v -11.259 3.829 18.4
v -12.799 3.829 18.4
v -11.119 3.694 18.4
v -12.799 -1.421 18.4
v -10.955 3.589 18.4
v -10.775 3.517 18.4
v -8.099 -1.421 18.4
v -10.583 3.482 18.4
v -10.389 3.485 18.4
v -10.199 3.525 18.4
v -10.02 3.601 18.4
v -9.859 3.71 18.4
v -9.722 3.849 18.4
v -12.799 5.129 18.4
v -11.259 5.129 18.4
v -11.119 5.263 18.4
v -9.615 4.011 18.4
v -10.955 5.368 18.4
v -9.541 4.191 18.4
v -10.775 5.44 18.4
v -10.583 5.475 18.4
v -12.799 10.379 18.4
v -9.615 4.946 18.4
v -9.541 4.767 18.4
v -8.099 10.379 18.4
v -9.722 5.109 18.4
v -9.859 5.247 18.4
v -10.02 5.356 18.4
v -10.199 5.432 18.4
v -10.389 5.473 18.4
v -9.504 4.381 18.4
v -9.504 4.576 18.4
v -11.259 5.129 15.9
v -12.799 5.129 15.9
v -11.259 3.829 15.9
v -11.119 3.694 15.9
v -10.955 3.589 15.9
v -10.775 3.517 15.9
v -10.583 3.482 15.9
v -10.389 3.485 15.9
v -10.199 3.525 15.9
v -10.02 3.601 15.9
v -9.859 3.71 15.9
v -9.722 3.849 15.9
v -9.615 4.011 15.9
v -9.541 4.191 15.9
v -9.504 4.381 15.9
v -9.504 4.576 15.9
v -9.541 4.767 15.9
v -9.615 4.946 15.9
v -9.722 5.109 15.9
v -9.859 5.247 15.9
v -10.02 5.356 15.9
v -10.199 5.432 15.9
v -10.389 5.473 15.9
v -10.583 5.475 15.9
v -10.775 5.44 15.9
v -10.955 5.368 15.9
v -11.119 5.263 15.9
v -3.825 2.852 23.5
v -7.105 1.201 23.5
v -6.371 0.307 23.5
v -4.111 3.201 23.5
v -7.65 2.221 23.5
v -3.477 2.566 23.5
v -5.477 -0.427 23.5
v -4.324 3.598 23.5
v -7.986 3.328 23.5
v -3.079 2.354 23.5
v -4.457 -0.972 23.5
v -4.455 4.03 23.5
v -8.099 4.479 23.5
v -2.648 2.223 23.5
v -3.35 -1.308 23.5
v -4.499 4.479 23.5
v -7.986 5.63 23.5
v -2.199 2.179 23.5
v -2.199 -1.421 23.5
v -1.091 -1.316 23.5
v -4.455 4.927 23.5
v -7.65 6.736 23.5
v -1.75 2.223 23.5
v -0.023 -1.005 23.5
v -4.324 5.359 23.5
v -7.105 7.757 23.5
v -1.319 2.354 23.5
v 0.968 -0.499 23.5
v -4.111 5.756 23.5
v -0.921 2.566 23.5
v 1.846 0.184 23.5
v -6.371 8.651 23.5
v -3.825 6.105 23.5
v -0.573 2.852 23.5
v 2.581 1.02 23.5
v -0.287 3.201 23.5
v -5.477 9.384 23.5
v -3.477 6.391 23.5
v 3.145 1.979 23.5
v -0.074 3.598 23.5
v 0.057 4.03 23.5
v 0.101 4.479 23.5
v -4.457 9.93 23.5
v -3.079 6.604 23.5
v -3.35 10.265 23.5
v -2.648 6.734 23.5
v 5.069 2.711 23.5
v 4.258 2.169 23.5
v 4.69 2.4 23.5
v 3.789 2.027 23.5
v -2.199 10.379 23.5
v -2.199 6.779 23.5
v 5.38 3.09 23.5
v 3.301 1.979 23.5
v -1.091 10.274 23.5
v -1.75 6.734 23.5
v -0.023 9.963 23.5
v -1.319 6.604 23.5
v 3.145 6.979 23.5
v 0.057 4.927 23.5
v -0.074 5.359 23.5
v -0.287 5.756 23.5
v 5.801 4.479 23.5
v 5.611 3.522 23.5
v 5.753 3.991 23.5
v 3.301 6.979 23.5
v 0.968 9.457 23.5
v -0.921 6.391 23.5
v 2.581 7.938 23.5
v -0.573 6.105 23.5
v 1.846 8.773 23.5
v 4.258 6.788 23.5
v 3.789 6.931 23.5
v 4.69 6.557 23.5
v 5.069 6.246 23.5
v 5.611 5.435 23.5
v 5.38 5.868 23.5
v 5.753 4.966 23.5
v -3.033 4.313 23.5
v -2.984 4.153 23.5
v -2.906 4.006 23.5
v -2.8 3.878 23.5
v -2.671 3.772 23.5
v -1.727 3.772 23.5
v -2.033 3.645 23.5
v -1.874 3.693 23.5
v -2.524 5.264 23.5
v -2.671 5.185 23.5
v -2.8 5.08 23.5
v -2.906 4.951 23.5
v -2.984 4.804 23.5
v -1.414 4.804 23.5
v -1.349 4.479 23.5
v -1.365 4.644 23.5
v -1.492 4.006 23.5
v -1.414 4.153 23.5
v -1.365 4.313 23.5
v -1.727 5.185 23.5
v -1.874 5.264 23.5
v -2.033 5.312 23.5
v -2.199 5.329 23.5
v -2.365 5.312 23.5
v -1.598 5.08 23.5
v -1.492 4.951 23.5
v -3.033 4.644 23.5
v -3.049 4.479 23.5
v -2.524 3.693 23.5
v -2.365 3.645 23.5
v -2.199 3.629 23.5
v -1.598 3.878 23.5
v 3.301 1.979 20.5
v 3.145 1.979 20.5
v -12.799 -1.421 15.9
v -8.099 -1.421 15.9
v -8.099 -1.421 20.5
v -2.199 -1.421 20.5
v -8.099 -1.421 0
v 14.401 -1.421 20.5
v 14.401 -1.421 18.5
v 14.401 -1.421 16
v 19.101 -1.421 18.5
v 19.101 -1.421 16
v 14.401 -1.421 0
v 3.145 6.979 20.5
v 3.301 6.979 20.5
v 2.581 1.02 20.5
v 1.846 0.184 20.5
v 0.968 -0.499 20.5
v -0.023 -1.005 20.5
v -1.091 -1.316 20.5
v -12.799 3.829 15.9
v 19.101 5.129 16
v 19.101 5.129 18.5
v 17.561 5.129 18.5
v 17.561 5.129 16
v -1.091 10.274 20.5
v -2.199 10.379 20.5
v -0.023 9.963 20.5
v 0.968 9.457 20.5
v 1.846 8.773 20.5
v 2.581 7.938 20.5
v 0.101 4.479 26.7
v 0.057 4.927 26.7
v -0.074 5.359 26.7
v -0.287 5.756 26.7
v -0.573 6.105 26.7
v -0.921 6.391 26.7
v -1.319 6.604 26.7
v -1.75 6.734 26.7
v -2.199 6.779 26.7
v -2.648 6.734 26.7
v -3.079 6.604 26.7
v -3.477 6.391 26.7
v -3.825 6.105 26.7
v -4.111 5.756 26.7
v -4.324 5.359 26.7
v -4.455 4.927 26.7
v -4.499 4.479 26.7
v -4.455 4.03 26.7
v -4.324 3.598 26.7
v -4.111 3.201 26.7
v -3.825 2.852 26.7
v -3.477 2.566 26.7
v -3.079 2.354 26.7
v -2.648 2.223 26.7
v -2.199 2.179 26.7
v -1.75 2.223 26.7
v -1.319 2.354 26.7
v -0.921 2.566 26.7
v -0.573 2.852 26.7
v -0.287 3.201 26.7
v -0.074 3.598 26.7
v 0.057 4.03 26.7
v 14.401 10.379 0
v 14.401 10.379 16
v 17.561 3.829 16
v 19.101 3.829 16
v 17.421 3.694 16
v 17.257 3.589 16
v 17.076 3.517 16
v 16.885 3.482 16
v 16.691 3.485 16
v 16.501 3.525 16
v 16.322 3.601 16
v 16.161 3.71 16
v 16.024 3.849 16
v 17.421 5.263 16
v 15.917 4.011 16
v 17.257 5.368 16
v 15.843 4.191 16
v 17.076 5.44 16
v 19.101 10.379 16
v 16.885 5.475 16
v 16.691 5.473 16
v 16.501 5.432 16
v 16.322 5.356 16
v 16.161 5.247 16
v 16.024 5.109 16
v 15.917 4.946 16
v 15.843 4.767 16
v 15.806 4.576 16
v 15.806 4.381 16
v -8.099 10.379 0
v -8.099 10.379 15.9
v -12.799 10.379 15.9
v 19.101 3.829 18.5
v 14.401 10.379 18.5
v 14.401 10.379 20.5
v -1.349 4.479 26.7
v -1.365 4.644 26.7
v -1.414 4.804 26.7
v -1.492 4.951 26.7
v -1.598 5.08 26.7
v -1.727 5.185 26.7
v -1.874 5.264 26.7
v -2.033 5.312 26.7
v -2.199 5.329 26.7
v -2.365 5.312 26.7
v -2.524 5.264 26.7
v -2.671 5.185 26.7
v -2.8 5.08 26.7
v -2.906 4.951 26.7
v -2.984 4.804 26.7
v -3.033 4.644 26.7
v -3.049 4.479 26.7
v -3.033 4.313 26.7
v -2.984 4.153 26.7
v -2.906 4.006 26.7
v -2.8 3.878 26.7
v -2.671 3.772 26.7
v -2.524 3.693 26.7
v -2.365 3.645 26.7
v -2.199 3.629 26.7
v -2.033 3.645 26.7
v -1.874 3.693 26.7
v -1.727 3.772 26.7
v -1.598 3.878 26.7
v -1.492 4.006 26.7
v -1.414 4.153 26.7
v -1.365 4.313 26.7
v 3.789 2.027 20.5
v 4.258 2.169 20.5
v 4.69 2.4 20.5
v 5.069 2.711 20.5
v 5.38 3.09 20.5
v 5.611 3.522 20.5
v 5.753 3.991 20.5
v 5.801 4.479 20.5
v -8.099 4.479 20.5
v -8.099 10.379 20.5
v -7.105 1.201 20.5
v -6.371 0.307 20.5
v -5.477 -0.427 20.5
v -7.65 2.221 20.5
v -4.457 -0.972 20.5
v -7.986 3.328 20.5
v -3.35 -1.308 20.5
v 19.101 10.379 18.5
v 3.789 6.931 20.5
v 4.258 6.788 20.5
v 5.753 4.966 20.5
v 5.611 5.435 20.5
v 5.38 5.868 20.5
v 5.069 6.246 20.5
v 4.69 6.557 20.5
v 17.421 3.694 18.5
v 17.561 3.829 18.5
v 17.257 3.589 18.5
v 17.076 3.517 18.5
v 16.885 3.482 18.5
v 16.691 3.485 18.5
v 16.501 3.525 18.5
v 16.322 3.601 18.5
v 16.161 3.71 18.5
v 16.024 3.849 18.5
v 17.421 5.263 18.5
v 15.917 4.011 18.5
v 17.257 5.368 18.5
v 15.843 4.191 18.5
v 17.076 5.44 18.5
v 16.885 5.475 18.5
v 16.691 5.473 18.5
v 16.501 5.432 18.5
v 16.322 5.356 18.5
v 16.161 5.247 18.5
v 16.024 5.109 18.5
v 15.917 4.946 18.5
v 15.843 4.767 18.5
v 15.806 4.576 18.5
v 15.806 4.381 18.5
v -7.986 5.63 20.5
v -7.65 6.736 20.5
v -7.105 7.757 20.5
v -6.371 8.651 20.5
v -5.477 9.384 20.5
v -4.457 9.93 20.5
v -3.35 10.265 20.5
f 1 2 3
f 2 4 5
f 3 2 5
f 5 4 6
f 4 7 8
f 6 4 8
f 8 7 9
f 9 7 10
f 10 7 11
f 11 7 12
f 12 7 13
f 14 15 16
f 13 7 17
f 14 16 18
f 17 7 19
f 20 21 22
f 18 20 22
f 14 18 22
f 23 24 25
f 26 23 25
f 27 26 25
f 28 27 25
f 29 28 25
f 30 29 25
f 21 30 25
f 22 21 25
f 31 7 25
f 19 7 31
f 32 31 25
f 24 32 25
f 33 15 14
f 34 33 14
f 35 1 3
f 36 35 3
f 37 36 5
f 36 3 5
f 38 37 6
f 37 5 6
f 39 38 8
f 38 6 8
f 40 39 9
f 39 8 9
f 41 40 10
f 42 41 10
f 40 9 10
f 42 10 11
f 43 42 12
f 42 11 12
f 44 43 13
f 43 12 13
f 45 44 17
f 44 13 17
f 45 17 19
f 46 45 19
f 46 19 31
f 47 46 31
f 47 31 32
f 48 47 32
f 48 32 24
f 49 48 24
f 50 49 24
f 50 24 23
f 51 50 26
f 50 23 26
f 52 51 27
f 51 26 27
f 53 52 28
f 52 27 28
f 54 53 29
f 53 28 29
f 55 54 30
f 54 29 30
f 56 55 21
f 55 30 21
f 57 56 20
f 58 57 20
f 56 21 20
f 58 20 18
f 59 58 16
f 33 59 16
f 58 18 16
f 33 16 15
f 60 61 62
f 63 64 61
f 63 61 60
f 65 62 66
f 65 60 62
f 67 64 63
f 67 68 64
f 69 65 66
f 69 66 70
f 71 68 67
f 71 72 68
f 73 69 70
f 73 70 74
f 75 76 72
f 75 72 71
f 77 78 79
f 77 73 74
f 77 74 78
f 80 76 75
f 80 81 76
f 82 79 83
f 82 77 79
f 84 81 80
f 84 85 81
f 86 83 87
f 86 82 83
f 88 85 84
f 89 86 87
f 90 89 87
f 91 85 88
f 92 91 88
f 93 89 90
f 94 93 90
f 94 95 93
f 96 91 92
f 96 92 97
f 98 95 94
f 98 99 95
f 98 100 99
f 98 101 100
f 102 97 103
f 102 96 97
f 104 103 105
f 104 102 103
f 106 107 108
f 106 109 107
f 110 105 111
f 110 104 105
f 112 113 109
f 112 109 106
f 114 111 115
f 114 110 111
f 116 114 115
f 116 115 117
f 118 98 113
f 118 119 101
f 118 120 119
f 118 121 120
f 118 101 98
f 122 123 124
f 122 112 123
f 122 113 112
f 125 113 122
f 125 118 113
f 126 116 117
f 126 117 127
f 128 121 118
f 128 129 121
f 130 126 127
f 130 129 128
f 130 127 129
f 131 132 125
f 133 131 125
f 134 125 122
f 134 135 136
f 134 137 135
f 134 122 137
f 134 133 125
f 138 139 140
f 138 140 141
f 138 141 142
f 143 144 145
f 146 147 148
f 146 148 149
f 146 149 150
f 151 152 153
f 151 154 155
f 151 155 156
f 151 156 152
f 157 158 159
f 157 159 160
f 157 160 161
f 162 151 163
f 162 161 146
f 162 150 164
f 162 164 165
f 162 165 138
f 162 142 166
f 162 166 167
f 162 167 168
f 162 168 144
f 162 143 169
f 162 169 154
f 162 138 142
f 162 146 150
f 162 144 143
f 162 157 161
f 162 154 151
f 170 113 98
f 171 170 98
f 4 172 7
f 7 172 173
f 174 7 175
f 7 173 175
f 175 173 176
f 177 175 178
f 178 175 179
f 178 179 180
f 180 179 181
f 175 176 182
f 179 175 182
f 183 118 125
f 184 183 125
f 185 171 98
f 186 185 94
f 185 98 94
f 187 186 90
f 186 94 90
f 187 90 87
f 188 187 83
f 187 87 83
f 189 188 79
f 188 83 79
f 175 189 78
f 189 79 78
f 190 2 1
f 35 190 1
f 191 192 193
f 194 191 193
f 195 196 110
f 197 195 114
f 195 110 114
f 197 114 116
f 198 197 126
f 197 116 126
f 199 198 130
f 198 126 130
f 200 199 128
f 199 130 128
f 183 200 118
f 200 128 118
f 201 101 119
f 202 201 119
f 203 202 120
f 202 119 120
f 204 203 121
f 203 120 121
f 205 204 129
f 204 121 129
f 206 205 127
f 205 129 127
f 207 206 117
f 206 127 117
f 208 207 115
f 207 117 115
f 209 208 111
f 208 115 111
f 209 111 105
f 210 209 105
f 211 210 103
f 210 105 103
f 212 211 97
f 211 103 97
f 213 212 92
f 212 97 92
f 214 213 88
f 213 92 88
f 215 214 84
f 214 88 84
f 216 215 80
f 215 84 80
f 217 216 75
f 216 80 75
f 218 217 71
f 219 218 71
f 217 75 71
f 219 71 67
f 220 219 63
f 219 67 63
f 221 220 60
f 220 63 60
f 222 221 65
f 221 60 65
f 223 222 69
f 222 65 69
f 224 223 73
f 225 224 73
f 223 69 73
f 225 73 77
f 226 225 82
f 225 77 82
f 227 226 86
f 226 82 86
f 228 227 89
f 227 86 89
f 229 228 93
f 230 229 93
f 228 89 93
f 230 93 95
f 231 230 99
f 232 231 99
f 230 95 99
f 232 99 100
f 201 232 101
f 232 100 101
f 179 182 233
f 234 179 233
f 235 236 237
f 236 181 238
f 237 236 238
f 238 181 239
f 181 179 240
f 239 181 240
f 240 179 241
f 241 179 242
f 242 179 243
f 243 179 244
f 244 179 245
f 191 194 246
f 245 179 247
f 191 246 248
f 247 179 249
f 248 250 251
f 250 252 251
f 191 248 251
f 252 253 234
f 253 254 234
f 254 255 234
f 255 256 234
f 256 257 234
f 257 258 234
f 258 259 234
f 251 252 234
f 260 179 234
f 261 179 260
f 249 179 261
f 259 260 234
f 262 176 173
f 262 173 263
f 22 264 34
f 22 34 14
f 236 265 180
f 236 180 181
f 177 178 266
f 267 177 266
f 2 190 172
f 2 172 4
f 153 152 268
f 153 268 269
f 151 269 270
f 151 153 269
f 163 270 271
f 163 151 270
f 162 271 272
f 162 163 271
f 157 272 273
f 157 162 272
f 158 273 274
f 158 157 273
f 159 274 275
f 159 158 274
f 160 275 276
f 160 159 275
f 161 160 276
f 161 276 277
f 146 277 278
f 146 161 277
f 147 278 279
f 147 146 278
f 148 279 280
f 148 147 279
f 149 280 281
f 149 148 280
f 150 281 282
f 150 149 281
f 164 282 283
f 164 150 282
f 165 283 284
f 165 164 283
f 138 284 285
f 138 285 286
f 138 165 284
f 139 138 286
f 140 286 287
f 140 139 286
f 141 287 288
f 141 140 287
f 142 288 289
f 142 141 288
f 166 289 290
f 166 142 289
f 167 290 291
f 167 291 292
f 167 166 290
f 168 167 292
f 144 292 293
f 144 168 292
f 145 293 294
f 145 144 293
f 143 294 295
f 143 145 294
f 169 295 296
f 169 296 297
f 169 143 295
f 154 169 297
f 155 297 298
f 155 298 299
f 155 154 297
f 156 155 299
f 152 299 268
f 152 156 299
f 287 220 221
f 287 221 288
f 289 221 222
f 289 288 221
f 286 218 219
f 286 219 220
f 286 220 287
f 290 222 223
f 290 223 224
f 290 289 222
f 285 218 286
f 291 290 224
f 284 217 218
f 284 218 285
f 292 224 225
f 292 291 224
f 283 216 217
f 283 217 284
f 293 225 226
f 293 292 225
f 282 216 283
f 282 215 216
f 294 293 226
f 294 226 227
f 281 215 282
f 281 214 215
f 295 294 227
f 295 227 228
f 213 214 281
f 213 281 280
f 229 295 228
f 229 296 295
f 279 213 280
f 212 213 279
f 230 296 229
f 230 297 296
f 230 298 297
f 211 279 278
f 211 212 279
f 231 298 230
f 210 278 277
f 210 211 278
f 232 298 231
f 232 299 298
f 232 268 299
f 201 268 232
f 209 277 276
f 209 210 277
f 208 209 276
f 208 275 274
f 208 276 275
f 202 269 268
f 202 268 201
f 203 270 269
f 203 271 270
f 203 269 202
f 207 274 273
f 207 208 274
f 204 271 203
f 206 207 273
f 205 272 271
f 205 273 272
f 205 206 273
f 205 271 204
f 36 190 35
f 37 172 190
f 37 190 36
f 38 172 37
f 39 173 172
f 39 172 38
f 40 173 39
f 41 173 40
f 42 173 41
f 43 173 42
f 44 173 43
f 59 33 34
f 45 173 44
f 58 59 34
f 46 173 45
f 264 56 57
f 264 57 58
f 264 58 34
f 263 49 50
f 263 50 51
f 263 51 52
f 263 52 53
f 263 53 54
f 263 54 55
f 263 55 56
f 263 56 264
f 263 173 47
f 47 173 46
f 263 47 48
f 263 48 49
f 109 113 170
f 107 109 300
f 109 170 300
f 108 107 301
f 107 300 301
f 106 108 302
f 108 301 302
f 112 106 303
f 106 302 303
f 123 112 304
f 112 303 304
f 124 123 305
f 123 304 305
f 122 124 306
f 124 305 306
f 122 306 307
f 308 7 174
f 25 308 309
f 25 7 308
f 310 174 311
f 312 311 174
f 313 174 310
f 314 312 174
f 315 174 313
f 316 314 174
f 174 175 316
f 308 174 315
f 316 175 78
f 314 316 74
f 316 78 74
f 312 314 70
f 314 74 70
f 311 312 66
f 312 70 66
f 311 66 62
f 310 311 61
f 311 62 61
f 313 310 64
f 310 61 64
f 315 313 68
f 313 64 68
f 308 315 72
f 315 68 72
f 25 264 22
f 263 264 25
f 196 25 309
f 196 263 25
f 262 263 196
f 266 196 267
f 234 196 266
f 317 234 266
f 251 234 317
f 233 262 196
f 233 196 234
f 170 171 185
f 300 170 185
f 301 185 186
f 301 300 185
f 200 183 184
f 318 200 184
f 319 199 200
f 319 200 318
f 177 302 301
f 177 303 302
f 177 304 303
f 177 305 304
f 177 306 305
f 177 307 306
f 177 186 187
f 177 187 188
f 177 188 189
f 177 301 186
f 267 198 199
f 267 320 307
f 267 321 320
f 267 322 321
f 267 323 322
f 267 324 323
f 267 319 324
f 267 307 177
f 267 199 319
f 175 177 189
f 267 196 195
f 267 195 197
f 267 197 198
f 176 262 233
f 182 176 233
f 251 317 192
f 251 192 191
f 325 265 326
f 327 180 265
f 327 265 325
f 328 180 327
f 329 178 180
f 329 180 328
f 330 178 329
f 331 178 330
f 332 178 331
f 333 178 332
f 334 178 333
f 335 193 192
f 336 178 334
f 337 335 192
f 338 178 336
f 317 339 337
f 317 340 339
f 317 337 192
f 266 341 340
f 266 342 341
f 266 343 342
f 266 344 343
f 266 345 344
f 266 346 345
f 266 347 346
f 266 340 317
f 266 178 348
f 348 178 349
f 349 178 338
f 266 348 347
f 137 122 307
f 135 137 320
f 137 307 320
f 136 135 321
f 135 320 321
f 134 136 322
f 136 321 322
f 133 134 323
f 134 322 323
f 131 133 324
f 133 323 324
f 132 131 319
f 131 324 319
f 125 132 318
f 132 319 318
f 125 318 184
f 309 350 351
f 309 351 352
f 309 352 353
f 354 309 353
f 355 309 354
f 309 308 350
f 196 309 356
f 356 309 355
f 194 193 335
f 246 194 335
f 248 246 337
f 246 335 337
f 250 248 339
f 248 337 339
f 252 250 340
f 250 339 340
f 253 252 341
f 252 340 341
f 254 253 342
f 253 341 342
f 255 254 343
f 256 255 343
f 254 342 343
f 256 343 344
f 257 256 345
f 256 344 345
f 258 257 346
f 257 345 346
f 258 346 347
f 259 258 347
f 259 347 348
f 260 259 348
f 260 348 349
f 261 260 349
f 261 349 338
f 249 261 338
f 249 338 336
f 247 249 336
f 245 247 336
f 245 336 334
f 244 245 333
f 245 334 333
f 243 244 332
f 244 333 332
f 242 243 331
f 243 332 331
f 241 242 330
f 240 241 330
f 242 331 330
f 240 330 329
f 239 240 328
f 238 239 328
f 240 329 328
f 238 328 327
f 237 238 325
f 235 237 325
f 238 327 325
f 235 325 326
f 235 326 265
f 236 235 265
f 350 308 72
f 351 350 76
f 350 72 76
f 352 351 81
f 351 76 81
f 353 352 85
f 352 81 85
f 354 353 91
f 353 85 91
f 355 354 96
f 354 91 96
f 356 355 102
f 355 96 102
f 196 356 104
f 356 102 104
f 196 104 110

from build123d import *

# Parameters (mm, degrees)
SKETCH1_W           = 22.5
SKETCH1_H           = 11.8
BOSS_EXTRUDE1_DEPTH = 26.7
SKETCH2_W           = 2.5
SKETCH2_H           = 11.8
BOSS_EXTRUDE2_DEPTH = 4.7
SKETCH5_W           = 2.5
SKETCH5_H           = 11.8
BOSS_EXTRUDE3_DEPTH = 4.7
CUT_EXTRUDE1_DEPTH  = 6.2
FILLET1_R           = 2.5
FILLET2_R           = 2.5
CUT_EXTRUDE2_DEPTH  = 3.2
SKETCH7_R           = 2.3
SKETCH7_R_2         = 0.85
BOSS_EXTRUDE4_DEPTH = 3.2
CUT_EXTRUDE3_DEPTH  = 2.5
CUT_EXTRUDE4_DEPTH  = 2.5


with BuildPart() as part:
    # Sketch1 → Boss-Extrude1 (new body)
    with BuildSketch(Plane.XY):
        with Locations((3.150909091, 4.478636364)):
            Rectangle(SKETCH1_W, SKETCH1_H)
    extrude(amount=BOSS_EXTRUDE1_DEPTH)

    # Sketch2 → Boss-Extrude2 (add)
    with BuildSketch(Plane(origin=(14.400909091, 0, 0), x_dir=(0, 0, -1), z_dir=(1, 0, 0))):
        with Locations((-17.25, 4.478636364)):
            Rectangle(SKETCH2_W, SKETCH2_H)
    extrude(amount=BOSS_EXTRUDE2_DEPTH)

    # Sketch5 → Boss-Extrude3 (add)
    with BuildSketch(Plane.ZY.offset(8.099090909)):
        with Locations((17.15, 4.478636364)):
            Rectangle(SKETCH5_W, SKETCH5_H)
    extrude(amount=BOSS_EXTRUDE3_DEPTH)

    # Sketch6 → Cut-Extrude1 (cut)
    with BuildSketch(Plane.XY.offset(26.7)):
        with BuildLine():
            Line((5.800909091, 1.978636364), (3.145064777, 1.978636364))
            ThreePointArc((3.145064777, 1.978636364), (0.967926621, -0.499315019), (-2.199090896, -1.421363636))
            Line((-2.199090896, -1.421363636), (14.400909091, -1.421363636))
            Line((14.400909091, -1.421363636), (14.400909091, 10.378636364))
            Line((14.400909091, 10.378636364), (-2.199090917, 10.378636364))
            ThreePointArc((-2.199090917, 10.378636364), (0.967926612, 9.456587752), (3.145064777, 6.978636364))
            Line((3.145064777, 6.978636364), (5.800909091, 6.978636364))
            Line((5.800909091, 6.978636364), (5.800909091, 1.978636364))
        make_face()
        with BuildLine():
            Line((-8.099090909, -1.421363636), (-2.199090896, -1.421363636))
            ThreePointArc((-2.199090896, -1.421363636), (-6.371020914, 0.30670635), (-8.099090909, 4.478636364))
            Line((-8.099090909, 4.478636364), (-8.099090909, -1.421363636))
        make_face()
        with BuildLine():
            Line((-8.099090909, 10.378636364), (-8.099090909, 4.478636364))
            ThreePointArc((-8.099090909, 4.478636364), (-6.371020921, 8.65056637), (-2.199090917, 10.378636364))
            Line((-2.199090917, 10.378636364), (-8.099090909, 10.378636364))
        make_face()
    extrude(amount=-CUT_EXTRUDE1_DEPTH, mode=Mode.SUBTRACT)

    # Fillet1
    fillet1_edges = [part.edges().sort_by_distance(p)[0] for p in [
        (5.800909091, 1.978636364, 23.6),
    ]]
    fillet(fillet1_edges, radius=FILLET1_R)

    # Fillet2
    fillet2_edges = [part.edges().sort_by_distance(p)[0] for p in [
        (5.800909091, 6.978636364, 23.6),
    ]]
    fillet(fillet2_edges, radius=FILLET2_R - 0.0001)  # a hair under: the kernel refuses the full size

    # Sketch6<3> → Cut-Extrude2 (cut)
    with BuildSketch(Plane.XY.offset(26.7)):
        with BuildLine():
            Line((3.145064777, 1.978636364), (5.800909091, 1.978636364))
            Line((5.800909091, 1.978636364), (5.800909091, 6.978636364))
            Line((5.800909091, 6.978636364), (3.145064777, 6.978636364))
            ThreePointArc((3.145064777, 6.978636364), (-8.099090909, 4.478636364), (3.145064777, 1.978636364))
        make_face()
    extrude(amount=-CUT_EXTRUDE2_DEPTH, mode=Mode.SUBTRACT)

    # Sketch7 → Boss-Extrude4 (add)
    with BuildSketch(Plane.XY.offset(23.5)):
        with Locations((-2.199090909, 4.478636364)):
            Circle(SKETCH7_R)
        with Locations((-2.199090909, 4.478636364)):
            Circle(SKETCH7_R_2, mode=Mode.SUBTRACT)
    extrude(amount=BOSS_EXTRUDE4_DEPTH)

    # Sketch11 → Cut-Extrude3 (cut)
    with BuildSketch(Plane.XY.offset(18.4)):
        with BuildLine():
            Line((-12.865758951, 3.828636364), (-11.259025117, 3.828636364))
            ThreePointArc((-11.259025117, 3.828636364), (-9.499090909, 4.478636364), (-11.259025117, 5.128636364))
            Line((-11.259025117, 5.128636364), (-12.865758951, 5.128636364))
            Line((-12.865758951, 5.128636364), (-12.865758951, 3.828636364))
        make_face()
    extrude(amount=-CUT_EXTRUDE3_DEPTH, mode=Mode.SUBTRACT)

    # Sketch12 → Cut-Extrude4 (cut)
    with BuildSketch(Plane.XY.offset(18.5)):
        with BuildLine():
            Line((17.560843299, 3.828636364), (19.100909091, 3.828636364))
            Line((19.100909091, 3.828636364), (19.100909091, 5.128636364))
            Line((19.100909091, 5.128636364), (17.560843299, 5.128636364))
            ThreePointArc((17.560843299, 5.128636364), (15.800909091, 4.478636364), (17.560843299, 3.828636364))
        make_face()
    extrude(amount=-CUT_EXTRUDE4_DEPTH, mode=Mode.SUBTRACT)


solid = part.part
